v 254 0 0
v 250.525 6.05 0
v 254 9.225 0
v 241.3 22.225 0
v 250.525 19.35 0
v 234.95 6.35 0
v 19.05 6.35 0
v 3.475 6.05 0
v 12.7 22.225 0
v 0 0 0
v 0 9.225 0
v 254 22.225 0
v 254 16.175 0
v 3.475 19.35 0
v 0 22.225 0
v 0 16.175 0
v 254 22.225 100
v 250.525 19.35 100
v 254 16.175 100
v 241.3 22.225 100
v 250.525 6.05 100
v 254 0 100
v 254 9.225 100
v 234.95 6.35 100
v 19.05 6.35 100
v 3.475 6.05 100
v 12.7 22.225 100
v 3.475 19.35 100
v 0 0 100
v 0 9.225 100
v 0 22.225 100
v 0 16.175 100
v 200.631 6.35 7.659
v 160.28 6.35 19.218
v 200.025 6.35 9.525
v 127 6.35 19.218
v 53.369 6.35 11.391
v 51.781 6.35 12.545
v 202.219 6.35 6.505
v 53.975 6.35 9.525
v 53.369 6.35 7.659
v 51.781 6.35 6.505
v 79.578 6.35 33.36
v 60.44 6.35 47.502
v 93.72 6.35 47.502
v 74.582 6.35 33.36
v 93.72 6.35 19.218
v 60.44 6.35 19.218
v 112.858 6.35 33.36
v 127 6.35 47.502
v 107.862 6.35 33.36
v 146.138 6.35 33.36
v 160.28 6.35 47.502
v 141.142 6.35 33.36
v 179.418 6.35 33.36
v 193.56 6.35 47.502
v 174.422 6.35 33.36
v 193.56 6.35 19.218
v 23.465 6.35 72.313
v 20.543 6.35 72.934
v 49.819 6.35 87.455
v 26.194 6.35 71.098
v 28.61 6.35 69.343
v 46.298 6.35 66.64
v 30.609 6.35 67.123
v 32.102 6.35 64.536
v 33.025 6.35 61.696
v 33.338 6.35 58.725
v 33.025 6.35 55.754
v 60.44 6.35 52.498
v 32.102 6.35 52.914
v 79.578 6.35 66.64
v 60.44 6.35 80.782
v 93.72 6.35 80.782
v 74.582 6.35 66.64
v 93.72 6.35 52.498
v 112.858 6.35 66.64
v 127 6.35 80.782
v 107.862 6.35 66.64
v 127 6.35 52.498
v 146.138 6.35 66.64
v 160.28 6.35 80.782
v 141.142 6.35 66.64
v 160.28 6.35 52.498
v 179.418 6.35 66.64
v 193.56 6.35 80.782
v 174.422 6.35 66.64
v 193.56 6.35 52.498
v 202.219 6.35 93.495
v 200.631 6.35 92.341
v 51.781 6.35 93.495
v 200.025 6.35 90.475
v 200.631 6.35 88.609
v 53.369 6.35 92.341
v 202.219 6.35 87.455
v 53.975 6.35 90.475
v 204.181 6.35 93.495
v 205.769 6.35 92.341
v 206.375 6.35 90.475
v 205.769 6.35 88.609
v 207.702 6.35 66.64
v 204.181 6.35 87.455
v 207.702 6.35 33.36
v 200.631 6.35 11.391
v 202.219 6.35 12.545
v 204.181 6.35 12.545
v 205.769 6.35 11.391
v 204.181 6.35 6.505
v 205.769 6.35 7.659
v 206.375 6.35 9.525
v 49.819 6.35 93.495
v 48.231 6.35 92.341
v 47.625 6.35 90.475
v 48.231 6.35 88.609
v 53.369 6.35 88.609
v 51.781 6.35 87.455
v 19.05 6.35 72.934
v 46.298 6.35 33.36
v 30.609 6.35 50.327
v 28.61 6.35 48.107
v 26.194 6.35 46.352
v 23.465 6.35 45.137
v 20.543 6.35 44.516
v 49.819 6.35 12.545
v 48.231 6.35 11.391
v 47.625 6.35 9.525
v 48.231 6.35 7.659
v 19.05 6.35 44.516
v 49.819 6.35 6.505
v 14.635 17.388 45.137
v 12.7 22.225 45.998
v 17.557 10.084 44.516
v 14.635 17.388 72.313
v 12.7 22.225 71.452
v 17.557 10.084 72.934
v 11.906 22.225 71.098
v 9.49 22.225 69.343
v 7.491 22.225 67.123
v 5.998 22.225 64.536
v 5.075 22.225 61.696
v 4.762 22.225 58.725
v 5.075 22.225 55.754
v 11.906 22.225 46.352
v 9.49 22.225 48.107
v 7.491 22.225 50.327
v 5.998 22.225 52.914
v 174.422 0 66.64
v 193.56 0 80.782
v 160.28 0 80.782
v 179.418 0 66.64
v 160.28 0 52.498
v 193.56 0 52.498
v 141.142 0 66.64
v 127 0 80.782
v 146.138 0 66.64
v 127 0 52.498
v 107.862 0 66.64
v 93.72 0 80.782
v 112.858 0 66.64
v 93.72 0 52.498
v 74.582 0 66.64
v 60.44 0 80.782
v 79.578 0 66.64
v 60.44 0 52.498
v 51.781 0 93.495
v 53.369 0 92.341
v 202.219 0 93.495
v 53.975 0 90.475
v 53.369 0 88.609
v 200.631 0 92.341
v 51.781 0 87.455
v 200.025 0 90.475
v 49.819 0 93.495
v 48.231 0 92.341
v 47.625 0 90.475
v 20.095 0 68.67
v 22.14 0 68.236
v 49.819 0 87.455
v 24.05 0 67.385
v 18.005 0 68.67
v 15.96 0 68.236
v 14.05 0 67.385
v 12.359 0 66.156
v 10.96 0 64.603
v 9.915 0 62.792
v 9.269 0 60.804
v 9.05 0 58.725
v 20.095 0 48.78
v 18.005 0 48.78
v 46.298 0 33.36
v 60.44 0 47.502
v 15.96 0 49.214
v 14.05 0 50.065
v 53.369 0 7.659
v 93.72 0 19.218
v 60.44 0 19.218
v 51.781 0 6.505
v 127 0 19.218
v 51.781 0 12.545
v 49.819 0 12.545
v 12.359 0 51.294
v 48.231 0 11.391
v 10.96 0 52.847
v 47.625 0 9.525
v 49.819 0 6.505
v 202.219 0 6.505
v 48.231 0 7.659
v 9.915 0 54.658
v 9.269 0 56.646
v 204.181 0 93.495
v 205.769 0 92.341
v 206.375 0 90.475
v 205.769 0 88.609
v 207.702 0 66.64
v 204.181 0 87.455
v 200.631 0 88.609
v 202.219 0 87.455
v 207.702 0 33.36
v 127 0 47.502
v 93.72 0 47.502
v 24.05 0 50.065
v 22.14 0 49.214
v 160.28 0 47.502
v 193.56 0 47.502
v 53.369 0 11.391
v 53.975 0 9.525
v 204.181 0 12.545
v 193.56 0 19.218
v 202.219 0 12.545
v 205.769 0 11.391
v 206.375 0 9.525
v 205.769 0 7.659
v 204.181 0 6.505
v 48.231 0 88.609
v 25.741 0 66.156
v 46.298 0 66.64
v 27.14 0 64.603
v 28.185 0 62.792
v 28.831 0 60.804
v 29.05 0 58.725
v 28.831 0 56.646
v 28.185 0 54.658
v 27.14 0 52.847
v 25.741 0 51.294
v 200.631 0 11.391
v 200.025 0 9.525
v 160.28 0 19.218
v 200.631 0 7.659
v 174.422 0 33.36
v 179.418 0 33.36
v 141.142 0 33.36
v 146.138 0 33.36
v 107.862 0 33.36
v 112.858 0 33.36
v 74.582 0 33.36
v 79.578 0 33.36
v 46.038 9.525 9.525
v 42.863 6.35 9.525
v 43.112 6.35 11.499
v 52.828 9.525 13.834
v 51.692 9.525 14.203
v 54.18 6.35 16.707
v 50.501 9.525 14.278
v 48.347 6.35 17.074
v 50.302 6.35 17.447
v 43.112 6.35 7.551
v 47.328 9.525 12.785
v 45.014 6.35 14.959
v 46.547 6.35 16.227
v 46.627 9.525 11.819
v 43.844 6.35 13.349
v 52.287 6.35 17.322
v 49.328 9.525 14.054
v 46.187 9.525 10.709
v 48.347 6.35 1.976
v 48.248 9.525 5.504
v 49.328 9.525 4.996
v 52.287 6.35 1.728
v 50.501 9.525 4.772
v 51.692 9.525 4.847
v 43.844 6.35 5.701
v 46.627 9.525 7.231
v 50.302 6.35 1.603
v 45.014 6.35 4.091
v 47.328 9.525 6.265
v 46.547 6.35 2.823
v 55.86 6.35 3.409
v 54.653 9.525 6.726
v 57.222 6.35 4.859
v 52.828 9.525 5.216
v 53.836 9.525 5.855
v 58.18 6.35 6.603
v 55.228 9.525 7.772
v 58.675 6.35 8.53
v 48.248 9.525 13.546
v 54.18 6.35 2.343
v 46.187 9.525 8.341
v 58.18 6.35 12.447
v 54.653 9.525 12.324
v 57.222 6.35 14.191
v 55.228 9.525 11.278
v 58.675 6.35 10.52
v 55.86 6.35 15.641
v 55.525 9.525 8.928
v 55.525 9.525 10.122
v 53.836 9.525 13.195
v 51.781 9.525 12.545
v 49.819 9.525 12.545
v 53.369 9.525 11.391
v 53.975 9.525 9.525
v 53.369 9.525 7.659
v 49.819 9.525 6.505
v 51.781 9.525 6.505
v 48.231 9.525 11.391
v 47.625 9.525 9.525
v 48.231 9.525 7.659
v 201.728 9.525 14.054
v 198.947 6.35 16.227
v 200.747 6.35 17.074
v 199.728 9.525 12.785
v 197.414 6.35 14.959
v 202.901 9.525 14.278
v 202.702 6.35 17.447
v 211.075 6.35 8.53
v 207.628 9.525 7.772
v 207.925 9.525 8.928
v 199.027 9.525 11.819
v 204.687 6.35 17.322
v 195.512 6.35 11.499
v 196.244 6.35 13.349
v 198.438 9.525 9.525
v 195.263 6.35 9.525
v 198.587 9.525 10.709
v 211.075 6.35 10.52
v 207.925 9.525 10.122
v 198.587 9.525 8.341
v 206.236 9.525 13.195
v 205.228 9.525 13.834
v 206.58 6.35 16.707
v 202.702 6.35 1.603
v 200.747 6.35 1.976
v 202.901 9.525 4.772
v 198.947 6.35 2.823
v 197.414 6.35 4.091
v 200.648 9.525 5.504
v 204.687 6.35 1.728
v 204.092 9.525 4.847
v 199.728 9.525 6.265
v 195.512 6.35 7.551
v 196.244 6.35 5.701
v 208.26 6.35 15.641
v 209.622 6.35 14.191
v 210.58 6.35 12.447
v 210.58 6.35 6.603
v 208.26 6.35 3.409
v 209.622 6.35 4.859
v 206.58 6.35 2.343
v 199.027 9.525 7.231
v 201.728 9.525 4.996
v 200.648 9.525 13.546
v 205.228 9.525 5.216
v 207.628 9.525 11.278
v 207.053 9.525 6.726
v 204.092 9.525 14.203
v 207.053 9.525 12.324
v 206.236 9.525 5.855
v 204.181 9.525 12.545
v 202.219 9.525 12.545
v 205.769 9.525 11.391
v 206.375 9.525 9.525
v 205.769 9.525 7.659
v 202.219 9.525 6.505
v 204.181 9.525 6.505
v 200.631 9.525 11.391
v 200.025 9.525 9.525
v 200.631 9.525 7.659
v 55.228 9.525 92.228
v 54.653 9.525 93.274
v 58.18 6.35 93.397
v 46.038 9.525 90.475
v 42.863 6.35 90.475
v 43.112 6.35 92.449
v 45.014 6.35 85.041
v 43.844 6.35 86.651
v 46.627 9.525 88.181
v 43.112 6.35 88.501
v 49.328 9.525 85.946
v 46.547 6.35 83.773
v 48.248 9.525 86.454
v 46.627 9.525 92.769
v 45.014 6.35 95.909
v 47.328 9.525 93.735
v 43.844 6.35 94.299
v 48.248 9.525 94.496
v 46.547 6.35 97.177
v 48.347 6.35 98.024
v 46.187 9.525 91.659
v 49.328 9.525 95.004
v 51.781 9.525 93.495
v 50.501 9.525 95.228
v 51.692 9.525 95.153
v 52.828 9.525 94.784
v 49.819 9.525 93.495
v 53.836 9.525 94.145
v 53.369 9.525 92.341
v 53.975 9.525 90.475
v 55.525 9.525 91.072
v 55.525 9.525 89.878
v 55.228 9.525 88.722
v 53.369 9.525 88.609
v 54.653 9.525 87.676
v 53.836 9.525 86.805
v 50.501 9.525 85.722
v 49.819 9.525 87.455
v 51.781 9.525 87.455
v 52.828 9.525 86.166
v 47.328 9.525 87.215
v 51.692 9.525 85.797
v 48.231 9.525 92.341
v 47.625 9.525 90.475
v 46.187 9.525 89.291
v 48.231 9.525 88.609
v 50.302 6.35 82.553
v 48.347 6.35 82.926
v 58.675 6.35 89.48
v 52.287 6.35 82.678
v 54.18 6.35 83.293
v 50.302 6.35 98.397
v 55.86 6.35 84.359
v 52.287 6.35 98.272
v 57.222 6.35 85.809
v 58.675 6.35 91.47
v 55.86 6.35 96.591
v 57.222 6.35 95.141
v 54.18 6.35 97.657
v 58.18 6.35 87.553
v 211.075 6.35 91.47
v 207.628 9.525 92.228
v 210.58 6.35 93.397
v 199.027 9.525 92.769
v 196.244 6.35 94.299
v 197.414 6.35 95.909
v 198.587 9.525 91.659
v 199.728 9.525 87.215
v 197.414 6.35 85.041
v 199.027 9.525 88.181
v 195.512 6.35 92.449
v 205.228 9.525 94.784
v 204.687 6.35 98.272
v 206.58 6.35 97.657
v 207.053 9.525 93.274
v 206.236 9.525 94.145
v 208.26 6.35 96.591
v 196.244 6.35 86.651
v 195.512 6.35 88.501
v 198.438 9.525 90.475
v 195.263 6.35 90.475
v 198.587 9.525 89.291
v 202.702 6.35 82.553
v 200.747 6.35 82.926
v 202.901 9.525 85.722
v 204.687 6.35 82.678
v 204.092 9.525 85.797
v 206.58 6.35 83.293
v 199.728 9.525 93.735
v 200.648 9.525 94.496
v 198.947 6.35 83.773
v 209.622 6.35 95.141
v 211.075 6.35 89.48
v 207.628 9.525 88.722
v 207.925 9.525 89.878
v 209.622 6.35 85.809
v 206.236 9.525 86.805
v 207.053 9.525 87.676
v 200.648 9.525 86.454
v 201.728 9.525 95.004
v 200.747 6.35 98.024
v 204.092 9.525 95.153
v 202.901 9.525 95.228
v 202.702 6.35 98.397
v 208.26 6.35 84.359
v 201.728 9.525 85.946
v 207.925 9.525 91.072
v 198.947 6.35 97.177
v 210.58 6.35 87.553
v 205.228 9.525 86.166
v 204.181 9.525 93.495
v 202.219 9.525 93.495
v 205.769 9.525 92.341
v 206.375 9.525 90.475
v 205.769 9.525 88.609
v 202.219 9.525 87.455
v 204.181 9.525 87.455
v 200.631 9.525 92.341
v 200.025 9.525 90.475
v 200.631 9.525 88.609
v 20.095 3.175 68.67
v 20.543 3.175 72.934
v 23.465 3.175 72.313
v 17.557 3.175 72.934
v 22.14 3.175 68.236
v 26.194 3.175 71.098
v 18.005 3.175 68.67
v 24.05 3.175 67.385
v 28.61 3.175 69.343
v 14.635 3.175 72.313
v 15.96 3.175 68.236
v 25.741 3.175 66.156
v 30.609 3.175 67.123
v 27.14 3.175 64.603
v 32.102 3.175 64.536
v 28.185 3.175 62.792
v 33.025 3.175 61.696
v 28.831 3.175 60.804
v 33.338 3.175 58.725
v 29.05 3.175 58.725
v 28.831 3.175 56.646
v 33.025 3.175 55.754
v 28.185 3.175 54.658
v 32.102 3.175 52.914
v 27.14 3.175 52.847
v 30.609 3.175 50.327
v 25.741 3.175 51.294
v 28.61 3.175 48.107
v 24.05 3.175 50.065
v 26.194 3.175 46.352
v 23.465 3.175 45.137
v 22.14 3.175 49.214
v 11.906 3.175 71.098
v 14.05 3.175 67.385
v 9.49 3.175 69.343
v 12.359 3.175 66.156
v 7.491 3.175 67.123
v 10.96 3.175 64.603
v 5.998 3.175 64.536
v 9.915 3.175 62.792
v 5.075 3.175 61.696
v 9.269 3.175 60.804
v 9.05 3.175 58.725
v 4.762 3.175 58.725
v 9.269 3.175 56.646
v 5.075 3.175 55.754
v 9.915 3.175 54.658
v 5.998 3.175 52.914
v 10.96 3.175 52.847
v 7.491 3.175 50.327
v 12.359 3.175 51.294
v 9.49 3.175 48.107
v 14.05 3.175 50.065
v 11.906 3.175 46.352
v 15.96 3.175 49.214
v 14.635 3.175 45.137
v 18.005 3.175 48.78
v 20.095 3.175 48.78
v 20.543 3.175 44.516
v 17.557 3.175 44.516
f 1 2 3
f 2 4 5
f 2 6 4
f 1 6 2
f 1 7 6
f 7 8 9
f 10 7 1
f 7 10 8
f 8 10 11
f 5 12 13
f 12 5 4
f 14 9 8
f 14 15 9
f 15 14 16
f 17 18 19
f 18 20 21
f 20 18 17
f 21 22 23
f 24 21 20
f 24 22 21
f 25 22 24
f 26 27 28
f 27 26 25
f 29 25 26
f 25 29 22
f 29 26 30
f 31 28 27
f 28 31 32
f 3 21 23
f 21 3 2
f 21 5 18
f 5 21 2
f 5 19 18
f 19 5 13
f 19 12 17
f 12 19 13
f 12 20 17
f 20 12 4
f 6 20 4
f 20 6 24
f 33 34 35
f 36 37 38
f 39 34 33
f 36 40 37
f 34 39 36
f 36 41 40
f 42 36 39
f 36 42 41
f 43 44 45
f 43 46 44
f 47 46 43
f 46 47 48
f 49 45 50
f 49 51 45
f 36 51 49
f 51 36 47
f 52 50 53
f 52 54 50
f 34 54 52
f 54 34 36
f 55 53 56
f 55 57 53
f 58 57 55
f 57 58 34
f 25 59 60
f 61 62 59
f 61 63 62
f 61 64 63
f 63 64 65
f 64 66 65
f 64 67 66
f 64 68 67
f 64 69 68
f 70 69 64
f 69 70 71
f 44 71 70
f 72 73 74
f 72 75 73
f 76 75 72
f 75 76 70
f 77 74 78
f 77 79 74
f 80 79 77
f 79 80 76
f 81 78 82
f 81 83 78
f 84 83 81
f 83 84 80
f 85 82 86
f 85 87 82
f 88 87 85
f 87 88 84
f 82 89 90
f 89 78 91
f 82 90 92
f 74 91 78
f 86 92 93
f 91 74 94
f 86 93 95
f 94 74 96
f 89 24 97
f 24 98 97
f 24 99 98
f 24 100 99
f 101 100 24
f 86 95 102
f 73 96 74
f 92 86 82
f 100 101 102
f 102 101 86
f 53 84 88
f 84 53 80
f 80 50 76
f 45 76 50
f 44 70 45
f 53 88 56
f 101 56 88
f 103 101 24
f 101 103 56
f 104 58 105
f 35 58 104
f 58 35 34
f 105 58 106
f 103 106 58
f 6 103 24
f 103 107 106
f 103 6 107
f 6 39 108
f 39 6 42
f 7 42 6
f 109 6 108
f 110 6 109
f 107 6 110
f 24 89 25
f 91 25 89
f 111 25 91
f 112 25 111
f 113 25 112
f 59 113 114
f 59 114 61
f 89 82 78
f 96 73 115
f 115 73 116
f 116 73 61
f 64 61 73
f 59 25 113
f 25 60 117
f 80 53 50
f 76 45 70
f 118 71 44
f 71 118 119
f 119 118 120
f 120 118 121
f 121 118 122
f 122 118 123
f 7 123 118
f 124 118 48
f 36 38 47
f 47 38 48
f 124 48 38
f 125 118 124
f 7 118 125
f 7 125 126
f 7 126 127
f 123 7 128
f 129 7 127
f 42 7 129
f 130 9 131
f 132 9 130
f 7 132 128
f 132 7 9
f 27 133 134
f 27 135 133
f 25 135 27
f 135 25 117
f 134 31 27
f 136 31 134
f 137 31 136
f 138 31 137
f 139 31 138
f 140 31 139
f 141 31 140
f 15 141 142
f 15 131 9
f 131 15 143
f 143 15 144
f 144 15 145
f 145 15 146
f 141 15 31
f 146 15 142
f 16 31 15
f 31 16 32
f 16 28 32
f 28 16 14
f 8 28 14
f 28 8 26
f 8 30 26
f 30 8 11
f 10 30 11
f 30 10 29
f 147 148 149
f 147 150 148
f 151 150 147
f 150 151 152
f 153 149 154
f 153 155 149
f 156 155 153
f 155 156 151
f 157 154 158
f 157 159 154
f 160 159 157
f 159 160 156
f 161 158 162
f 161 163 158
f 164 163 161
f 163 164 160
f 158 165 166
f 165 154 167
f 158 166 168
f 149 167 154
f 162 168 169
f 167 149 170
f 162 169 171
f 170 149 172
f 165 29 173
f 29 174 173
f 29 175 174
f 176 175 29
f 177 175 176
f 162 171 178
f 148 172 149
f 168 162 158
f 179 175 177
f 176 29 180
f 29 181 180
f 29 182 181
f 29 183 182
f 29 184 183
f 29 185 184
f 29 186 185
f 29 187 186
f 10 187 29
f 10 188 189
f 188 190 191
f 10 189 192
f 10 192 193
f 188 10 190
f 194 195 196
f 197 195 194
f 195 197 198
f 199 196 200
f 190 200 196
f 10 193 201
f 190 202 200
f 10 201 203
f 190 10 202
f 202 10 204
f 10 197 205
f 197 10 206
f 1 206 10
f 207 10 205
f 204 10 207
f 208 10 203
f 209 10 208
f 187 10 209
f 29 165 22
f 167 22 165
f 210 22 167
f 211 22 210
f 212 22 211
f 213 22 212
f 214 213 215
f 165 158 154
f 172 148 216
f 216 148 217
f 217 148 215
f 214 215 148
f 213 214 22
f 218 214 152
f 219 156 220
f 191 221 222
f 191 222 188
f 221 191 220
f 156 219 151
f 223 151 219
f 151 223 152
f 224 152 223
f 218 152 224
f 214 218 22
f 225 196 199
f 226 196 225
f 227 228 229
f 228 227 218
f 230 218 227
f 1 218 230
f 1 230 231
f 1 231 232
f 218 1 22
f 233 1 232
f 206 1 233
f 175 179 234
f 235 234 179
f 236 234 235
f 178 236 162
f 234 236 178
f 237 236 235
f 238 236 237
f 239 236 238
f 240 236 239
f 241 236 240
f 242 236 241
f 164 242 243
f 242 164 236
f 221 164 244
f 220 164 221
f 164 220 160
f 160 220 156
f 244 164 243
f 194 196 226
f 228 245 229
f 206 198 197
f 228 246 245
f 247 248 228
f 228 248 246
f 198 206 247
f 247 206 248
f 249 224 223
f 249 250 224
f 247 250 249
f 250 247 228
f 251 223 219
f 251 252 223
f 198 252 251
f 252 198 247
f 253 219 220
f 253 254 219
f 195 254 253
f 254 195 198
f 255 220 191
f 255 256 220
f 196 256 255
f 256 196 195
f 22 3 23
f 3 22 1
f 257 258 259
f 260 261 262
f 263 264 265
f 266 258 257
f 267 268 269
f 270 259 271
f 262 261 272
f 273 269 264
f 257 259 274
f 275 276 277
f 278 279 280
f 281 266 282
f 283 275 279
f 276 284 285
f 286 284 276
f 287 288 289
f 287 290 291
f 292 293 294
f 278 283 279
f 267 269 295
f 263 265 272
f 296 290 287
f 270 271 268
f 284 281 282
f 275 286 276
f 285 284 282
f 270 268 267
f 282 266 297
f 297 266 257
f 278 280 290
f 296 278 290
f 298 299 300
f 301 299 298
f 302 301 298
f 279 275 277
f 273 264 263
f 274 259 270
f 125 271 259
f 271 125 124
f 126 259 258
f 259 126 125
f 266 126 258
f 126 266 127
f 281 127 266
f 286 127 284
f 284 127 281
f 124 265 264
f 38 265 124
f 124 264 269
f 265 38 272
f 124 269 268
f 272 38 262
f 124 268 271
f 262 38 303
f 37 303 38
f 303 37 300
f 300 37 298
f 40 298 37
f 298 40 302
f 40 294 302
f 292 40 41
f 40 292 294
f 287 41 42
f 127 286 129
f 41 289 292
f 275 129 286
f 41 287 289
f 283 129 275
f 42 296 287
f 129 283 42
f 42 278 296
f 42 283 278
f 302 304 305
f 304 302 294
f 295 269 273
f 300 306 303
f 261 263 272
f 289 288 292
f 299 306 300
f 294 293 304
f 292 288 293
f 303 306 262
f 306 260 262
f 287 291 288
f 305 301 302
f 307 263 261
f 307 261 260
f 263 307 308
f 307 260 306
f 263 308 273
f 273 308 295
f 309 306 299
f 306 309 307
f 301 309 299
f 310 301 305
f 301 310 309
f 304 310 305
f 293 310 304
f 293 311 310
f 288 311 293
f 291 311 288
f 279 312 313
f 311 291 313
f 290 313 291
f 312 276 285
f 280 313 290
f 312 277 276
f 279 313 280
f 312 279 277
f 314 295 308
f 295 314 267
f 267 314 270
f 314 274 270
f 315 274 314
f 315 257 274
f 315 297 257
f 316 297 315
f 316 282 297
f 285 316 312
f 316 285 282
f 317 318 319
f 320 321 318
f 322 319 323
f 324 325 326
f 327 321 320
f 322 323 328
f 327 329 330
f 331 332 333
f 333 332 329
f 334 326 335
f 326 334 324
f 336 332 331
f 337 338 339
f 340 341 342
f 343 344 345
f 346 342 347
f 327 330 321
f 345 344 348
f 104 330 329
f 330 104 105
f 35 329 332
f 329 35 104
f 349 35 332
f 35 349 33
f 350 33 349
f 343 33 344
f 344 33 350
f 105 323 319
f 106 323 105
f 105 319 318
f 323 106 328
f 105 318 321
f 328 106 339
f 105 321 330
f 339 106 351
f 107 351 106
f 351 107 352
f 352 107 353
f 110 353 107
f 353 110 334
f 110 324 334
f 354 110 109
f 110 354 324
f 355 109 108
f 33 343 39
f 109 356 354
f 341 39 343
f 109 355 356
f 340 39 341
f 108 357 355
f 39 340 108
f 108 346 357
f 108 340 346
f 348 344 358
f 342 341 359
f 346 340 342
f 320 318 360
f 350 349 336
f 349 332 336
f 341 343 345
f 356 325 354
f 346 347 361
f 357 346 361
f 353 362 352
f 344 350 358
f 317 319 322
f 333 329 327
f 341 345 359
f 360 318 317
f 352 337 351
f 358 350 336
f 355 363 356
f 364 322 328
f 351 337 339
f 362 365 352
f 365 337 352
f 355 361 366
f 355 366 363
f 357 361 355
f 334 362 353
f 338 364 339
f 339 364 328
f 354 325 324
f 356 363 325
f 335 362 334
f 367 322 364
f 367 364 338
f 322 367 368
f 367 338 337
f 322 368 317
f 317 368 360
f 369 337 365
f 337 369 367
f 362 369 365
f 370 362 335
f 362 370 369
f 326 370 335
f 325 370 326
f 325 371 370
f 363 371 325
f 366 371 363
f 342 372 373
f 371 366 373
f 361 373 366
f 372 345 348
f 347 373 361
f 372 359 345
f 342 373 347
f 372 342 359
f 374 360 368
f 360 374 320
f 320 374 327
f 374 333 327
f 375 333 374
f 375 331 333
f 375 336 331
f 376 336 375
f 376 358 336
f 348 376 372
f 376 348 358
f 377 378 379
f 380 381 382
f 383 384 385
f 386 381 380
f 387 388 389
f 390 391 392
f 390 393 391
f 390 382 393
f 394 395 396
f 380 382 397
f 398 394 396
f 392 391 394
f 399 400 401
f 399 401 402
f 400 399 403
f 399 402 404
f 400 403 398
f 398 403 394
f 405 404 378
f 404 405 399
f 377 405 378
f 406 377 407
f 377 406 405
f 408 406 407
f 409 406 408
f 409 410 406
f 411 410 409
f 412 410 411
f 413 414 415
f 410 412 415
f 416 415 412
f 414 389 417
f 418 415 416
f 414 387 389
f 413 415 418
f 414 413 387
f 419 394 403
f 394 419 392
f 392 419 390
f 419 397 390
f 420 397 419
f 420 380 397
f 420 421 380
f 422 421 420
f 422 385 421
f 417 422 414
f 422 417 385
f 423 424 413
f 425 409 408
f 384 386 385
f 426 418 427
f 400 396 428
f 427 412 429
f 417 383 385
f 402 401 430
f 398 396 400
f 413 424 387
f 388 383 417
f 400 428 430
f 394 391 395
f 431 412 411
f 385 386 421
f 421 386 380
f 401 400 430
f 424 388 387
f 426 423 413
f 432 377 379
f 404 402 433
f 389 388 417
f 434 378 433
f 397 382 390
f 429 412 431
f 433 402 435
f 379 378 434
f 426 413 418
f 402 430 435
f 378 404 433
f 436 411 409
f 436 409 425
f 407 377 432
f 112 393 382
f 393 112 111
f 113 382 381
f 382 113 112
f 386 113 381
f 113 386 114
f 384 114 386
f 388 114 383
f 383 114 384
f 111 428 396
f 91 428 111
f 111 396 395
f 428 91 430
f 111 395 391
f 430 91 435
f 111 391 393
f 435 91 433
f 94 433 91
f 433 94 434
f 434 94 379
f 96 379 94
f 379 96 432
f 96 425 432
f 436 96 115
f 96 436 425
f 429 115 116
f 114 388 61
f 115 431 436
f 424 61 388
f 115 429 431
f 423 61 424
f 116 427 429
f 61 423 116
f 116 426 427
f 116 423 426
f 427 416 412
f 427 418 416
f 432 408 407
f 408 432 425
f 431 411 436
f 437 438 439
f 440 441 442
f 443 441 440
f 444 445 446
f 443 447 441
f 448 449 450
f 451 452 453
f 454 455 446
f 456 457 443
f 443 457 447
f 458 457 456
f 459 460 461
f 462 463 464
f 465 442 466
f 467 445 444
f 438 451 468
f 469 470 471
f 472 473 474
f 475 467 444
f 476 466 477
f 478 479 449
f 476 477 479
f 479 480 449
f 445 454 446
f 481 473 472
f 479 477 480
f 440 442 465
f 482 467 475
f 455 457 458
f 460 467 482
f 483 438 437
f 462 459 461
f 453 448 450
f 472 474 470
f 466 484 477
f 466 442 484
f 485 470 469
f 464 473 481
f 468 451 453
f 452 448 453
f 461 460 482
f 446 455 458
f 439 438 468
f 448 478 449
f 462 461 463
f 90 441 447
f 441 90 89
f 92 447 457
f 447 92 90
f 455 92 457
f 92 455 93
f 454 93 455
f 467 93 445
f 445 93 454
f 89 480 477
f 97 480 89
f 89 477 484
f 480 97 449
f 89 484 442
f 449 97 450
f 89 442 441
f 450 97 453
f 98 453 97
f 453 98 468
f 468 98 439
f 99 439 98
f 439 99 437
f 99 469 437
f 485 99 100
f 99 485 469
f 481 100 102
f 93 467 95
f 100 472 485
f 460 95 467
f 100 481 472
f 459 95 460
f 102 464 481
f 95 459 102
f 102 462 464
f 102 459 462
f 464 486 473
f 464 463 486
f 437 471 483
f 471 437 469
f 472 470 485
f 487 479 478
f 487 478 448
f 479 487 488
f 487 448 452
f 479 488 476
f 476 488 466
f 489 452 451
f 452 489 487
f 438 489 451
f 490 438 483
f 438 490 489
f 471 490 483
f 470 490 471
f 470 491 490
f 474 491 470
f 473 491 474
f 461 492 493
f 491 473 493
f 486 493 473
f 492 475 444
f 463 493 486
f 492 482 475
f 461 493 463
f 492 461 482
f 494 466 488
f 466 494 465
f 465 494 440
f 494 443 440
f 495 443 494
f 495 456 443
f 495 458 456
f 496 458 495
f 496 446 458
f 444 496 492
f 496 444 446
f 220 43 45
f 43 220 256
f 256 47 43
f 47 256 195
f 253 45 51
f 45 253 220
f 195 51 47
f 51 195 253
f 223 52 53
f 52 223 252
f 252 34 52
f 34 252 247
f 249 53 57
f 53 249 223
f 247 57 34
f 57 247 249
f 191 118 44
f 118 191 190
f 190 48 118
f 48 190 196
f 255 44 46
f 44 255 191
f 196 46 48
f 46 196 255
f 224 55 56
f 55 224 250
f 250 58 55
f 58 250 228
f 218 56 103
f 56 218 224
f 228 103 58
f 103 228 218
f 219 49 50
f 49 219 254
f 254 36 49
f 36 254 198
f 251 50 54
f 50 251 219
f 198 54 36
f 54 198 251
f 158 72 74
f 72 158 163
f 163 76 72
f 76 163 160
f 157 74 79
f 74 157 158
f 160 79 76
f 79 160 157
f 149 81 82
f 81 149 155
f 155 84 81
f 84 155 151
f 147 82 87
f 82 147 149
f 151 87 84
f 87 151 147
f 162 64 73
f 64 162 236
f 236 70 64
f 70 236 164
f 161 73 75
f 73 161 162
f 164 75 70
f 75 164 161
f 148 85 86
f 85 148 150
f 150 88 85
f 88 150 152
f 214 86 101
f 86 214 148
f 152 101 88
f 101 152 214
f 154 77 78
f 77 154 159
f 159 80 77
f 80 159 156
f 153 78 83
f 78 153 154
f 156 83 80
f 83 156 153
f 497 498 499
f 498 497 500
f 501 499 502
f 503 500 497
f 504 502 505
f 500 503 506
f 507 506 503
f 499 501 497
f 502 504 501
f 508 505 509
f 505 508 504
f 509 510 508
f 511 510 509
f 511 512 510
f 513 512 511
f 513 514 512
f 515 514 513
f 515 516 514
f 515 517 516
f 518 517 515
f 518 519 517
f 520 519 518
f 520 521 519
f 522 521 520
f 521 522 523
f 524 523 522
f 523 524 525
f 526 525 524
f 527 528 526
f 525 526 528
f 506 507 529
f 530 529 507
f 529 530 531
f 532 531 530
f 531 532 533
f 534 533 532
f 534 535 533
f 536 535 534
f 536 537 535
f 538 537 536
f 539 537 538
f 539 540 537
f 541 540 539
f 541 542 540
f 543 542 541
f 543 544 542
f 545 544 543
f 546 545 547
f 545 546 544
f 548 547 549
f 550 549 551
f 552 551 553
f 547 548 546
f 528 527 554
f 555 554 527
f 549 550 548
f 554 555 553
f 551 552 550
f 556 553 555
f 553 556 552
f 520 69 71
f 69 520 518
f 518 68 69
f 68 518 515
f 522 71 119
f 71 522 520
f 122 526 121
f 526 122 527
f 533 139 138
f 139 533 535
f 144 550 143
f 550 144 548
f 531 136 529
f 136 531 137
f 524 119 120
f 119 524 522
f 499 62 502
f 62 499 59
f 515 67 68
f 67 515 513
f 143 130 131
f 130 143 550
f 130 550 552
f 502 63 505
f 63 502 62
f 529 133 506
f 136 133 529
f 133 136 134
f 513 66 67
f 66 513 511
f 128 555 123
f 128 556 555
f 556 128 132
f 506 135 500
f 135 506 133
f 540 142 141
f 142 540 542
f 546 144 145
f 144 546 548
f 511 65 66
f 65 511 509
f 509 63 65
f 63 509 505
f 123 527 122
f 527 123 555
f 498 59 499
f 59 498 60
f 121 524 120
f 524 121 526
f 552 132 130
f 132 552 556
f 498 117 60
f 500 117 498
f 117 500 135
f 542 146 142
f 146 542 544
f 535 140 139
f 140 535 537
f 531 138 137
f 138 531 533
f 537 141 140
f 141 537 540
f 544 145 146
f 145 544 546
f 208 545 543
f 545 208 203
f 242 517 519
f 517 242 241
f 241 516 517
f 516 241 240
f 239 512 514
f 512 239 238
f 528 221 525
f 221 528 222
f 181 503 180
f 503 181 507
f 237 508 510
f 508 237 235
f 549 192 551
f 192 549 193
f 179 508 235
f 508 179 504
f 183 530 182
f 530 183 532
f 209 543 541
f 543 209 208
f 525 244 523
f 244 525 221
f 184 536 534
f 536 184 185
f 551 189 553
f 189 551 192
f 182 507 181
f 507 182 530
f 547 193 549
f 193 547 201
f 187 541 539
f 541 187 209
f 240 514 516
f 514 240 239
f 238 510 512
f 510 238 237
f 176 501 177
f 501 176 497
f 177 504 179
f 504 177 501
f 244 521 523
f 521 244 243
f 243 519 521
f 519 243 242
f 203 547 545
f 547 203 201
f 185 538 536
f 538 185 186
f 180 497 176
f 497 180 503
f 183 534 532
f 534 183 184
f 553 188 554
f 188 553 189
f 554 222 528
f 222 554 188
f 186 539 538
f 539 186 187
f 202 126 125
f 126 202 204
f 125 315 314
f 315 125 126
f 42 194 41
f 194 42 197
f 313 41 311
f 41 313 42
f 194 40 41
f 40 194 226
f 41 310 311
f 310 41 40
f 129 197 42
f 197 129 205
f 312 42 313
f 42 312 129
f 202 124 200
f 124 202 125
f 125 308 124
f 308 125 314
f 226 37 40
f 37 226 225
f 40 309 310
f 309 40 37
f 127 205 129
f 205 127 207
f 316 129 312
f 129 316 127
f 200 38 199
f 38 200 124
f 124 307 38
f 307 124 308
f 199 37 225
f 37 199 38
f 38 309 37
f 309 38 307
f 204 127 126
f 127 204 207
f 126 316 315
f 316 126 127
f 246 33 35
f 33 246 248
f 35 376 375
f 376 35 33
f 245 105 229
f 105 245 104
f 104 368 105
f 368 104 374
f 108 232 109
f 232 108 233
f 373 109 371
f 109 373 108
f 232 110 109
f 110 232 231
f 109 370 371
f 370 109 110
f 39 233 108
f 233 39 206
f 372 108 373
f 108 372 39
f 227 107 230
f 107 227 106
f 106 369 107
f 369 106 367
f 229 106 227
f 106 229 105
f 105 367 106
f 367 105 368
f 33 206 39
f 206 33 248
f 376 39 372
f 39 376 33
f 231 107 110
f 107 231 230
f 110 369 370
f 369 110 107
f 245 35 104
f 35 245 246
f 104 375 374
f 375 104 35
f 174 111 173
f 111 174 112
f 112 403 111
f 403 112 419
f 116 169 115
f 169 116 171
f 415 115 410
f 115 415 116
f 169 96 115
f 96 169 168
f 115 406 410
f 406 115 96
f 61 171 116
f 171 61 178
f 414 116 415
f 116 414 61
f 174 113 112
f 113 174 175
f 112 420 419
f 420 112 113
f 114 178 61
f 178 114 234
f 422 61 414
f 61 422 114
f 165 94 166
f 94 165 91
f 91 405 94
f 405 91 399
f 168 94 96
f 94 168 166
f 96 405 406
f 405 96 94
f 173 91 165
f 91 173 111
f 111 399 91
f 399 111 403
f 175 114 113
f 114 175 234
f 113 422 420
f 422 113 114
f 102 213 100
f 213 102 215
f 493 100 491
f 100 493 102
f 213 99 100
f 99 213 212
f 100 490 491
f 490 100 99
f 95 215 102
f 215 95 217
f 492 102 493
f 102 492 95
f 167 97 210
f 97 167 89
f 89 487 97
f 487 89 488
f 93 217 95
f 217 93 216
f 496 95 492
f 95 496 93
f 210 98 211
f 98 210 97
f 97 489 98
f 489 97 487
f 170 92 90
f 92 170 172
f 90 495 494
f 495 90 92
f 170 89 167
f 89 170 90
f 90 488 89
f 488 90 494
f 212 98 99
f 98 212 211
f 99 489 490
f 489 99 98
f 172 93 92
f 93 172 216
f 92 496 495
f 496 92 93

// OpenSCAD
include <MCAD/units.scad>

// Height in mm
height = 100;

// Has button?
has_button = true;

width = 10 * inch;
thick = (7/8) * inch;
ledge = (1/2) * inch;
wall = (1/4) * inch;
slope = (1/4) * inch;
hole_top_offset = (3/8) * inch;
hole_side_offset = 2 * inch;
hole_dia = (1/4) * inch;
button_side_offset = (3/4) * inch;
button_top_offset = (1 + (5/8)) * inch;
button = (height < (button_top_offset * 2)) ? (height / 2) : button_top_offset;
button_dia = (1 + (1/8)) * inch;
button_hole_dia = 20 * mm;
gap = 20 * mm;
gap_spacing = 1.414 * gap + 5;
h_gap_span = (width / 2) - hole_side_offset;
v_gap_span = (height / 2) - hole_top_offset;
bump_height = (1/8) * inch;
bump_dia = (3/8) * inch;

tol = 0.3 * mm;

module gap_row() {
  union() {
    rotate([-90, 45, 0])
      cube(gap, center = true);
    
    for(dx=[gap_spacing:gap_spacing:h_gap_span]) {
      translate([-dx, 0, 0])
        rotate([-90, 45, 0])
        cube(gap, center = true);
      translate([dx, 0, 0])
        rotate([-90, 45, 0])
        cube(gap, center = true);
    }
  }
}

module gaps() {
  union() {
    if ((v_gap_span % gap_spacing) < (gap_spacing / 2)) {
      for(dz=[gap_spacing / 2:gap_spacing:v_gap_span]) {
        translate([0, 0, -dz])
          gap_row();
        translate([0, 0, dz])
          gap_row();
      }
    } else {
      gap_row();
      
      for(dz=[gap_spacing:gap_spacing:v_gap_span]) {
        translate([0, 0, -dz])
          gap_row();
        translate([0, 0, dz])
          gap_row();
      }
    }
  }
}

module bump() {
  rotate_extrude() {
    poly = [
      [0, 0],
      [0, -bump_height],
      [bump_dia / 2, -bump_height],
      [(bump_dia / 2) + bump_height, 0],
      [0, 0]];
    polygon(poly);
  }
}

difference() {
  union() {
    linear_extrude(height) {
      poly = [
        [0, 0],
        [0, ((3/8) * inch) - tol],
        [((1/8) * inch) + tol, ((1/4) * inch) - tol],
        [((1/8) * inch) + tol, ((3/4) * inch) + tol],
        [0, ((5/8) * inch) + tol],
        [0, thick],
        [ledge, thick],
        [ledge + slope, wall],
        [width - slope - ledge, wall],
        [width - ledge, thick],
        [width, thick],
        [width, ((5/8) * inch) + tol],
        [width - ((1/8) * inch) - tol, ((3/4) * inch) + tol],
        [width - ((1/8) * inch) - tol, ((1/4) * inch) - tol],
        [width, ((3/8) * inch) - tol],
        [width, 0],
        [0,0]];
      polygon(poly);
    }
    translate([hole_side_offset, wall, hole_top_offset])
      rotate([90, 0, 0])
      bump();
    translate([width - hole_side_offset, wall, hole_top_offset])
      rotate([90, 0, 0])
      bump();
    translate([hole_side_offset, wall, height - hole_top_offset])
      rotate([90, 0, 0])
      bump();
    translate([width - hole_side_offset, wall, height - hole_top_offset])
      rotate([90, 0, 0])
      bump();
  }
  
  translate([hole_side_offset, 0, hole_top_offset])
    rotate([-90, 0, 0])
    cylinder(h = thick, d = hole_dia);
  translate([width - hole_side_offset, 0, hole_top_offset])
    rotate([-90, 0, 0])
    cylinder(h = thick, d = hole_dia);
  
  translate([hole_side_offset, 0, height - hole_top_offset])
    rotate([-90, 0, 0])
    cylinder(h = thick, d = hole_dia);
  translate([width - hole_side_offset, 0, height - hole_top_offset])
    rotate([-90, 0, 0])
    cylinder(h = thick, d = hole_dia);
  
  translate([width / 2, 0, height / 2])
    gaps();
  
  if (has_button) {
    translate([button_side_offset, (1/8) * inch, height - button])
      rotate([-90, 0, 0])
      cylinder(h = thick,d = button_dia);
    
    translate([button_side_offset, 0, height - button])
      rotate([-90, 0, 0])
      cylinder(h = thick,d = button_hole_dia);
  }
}
